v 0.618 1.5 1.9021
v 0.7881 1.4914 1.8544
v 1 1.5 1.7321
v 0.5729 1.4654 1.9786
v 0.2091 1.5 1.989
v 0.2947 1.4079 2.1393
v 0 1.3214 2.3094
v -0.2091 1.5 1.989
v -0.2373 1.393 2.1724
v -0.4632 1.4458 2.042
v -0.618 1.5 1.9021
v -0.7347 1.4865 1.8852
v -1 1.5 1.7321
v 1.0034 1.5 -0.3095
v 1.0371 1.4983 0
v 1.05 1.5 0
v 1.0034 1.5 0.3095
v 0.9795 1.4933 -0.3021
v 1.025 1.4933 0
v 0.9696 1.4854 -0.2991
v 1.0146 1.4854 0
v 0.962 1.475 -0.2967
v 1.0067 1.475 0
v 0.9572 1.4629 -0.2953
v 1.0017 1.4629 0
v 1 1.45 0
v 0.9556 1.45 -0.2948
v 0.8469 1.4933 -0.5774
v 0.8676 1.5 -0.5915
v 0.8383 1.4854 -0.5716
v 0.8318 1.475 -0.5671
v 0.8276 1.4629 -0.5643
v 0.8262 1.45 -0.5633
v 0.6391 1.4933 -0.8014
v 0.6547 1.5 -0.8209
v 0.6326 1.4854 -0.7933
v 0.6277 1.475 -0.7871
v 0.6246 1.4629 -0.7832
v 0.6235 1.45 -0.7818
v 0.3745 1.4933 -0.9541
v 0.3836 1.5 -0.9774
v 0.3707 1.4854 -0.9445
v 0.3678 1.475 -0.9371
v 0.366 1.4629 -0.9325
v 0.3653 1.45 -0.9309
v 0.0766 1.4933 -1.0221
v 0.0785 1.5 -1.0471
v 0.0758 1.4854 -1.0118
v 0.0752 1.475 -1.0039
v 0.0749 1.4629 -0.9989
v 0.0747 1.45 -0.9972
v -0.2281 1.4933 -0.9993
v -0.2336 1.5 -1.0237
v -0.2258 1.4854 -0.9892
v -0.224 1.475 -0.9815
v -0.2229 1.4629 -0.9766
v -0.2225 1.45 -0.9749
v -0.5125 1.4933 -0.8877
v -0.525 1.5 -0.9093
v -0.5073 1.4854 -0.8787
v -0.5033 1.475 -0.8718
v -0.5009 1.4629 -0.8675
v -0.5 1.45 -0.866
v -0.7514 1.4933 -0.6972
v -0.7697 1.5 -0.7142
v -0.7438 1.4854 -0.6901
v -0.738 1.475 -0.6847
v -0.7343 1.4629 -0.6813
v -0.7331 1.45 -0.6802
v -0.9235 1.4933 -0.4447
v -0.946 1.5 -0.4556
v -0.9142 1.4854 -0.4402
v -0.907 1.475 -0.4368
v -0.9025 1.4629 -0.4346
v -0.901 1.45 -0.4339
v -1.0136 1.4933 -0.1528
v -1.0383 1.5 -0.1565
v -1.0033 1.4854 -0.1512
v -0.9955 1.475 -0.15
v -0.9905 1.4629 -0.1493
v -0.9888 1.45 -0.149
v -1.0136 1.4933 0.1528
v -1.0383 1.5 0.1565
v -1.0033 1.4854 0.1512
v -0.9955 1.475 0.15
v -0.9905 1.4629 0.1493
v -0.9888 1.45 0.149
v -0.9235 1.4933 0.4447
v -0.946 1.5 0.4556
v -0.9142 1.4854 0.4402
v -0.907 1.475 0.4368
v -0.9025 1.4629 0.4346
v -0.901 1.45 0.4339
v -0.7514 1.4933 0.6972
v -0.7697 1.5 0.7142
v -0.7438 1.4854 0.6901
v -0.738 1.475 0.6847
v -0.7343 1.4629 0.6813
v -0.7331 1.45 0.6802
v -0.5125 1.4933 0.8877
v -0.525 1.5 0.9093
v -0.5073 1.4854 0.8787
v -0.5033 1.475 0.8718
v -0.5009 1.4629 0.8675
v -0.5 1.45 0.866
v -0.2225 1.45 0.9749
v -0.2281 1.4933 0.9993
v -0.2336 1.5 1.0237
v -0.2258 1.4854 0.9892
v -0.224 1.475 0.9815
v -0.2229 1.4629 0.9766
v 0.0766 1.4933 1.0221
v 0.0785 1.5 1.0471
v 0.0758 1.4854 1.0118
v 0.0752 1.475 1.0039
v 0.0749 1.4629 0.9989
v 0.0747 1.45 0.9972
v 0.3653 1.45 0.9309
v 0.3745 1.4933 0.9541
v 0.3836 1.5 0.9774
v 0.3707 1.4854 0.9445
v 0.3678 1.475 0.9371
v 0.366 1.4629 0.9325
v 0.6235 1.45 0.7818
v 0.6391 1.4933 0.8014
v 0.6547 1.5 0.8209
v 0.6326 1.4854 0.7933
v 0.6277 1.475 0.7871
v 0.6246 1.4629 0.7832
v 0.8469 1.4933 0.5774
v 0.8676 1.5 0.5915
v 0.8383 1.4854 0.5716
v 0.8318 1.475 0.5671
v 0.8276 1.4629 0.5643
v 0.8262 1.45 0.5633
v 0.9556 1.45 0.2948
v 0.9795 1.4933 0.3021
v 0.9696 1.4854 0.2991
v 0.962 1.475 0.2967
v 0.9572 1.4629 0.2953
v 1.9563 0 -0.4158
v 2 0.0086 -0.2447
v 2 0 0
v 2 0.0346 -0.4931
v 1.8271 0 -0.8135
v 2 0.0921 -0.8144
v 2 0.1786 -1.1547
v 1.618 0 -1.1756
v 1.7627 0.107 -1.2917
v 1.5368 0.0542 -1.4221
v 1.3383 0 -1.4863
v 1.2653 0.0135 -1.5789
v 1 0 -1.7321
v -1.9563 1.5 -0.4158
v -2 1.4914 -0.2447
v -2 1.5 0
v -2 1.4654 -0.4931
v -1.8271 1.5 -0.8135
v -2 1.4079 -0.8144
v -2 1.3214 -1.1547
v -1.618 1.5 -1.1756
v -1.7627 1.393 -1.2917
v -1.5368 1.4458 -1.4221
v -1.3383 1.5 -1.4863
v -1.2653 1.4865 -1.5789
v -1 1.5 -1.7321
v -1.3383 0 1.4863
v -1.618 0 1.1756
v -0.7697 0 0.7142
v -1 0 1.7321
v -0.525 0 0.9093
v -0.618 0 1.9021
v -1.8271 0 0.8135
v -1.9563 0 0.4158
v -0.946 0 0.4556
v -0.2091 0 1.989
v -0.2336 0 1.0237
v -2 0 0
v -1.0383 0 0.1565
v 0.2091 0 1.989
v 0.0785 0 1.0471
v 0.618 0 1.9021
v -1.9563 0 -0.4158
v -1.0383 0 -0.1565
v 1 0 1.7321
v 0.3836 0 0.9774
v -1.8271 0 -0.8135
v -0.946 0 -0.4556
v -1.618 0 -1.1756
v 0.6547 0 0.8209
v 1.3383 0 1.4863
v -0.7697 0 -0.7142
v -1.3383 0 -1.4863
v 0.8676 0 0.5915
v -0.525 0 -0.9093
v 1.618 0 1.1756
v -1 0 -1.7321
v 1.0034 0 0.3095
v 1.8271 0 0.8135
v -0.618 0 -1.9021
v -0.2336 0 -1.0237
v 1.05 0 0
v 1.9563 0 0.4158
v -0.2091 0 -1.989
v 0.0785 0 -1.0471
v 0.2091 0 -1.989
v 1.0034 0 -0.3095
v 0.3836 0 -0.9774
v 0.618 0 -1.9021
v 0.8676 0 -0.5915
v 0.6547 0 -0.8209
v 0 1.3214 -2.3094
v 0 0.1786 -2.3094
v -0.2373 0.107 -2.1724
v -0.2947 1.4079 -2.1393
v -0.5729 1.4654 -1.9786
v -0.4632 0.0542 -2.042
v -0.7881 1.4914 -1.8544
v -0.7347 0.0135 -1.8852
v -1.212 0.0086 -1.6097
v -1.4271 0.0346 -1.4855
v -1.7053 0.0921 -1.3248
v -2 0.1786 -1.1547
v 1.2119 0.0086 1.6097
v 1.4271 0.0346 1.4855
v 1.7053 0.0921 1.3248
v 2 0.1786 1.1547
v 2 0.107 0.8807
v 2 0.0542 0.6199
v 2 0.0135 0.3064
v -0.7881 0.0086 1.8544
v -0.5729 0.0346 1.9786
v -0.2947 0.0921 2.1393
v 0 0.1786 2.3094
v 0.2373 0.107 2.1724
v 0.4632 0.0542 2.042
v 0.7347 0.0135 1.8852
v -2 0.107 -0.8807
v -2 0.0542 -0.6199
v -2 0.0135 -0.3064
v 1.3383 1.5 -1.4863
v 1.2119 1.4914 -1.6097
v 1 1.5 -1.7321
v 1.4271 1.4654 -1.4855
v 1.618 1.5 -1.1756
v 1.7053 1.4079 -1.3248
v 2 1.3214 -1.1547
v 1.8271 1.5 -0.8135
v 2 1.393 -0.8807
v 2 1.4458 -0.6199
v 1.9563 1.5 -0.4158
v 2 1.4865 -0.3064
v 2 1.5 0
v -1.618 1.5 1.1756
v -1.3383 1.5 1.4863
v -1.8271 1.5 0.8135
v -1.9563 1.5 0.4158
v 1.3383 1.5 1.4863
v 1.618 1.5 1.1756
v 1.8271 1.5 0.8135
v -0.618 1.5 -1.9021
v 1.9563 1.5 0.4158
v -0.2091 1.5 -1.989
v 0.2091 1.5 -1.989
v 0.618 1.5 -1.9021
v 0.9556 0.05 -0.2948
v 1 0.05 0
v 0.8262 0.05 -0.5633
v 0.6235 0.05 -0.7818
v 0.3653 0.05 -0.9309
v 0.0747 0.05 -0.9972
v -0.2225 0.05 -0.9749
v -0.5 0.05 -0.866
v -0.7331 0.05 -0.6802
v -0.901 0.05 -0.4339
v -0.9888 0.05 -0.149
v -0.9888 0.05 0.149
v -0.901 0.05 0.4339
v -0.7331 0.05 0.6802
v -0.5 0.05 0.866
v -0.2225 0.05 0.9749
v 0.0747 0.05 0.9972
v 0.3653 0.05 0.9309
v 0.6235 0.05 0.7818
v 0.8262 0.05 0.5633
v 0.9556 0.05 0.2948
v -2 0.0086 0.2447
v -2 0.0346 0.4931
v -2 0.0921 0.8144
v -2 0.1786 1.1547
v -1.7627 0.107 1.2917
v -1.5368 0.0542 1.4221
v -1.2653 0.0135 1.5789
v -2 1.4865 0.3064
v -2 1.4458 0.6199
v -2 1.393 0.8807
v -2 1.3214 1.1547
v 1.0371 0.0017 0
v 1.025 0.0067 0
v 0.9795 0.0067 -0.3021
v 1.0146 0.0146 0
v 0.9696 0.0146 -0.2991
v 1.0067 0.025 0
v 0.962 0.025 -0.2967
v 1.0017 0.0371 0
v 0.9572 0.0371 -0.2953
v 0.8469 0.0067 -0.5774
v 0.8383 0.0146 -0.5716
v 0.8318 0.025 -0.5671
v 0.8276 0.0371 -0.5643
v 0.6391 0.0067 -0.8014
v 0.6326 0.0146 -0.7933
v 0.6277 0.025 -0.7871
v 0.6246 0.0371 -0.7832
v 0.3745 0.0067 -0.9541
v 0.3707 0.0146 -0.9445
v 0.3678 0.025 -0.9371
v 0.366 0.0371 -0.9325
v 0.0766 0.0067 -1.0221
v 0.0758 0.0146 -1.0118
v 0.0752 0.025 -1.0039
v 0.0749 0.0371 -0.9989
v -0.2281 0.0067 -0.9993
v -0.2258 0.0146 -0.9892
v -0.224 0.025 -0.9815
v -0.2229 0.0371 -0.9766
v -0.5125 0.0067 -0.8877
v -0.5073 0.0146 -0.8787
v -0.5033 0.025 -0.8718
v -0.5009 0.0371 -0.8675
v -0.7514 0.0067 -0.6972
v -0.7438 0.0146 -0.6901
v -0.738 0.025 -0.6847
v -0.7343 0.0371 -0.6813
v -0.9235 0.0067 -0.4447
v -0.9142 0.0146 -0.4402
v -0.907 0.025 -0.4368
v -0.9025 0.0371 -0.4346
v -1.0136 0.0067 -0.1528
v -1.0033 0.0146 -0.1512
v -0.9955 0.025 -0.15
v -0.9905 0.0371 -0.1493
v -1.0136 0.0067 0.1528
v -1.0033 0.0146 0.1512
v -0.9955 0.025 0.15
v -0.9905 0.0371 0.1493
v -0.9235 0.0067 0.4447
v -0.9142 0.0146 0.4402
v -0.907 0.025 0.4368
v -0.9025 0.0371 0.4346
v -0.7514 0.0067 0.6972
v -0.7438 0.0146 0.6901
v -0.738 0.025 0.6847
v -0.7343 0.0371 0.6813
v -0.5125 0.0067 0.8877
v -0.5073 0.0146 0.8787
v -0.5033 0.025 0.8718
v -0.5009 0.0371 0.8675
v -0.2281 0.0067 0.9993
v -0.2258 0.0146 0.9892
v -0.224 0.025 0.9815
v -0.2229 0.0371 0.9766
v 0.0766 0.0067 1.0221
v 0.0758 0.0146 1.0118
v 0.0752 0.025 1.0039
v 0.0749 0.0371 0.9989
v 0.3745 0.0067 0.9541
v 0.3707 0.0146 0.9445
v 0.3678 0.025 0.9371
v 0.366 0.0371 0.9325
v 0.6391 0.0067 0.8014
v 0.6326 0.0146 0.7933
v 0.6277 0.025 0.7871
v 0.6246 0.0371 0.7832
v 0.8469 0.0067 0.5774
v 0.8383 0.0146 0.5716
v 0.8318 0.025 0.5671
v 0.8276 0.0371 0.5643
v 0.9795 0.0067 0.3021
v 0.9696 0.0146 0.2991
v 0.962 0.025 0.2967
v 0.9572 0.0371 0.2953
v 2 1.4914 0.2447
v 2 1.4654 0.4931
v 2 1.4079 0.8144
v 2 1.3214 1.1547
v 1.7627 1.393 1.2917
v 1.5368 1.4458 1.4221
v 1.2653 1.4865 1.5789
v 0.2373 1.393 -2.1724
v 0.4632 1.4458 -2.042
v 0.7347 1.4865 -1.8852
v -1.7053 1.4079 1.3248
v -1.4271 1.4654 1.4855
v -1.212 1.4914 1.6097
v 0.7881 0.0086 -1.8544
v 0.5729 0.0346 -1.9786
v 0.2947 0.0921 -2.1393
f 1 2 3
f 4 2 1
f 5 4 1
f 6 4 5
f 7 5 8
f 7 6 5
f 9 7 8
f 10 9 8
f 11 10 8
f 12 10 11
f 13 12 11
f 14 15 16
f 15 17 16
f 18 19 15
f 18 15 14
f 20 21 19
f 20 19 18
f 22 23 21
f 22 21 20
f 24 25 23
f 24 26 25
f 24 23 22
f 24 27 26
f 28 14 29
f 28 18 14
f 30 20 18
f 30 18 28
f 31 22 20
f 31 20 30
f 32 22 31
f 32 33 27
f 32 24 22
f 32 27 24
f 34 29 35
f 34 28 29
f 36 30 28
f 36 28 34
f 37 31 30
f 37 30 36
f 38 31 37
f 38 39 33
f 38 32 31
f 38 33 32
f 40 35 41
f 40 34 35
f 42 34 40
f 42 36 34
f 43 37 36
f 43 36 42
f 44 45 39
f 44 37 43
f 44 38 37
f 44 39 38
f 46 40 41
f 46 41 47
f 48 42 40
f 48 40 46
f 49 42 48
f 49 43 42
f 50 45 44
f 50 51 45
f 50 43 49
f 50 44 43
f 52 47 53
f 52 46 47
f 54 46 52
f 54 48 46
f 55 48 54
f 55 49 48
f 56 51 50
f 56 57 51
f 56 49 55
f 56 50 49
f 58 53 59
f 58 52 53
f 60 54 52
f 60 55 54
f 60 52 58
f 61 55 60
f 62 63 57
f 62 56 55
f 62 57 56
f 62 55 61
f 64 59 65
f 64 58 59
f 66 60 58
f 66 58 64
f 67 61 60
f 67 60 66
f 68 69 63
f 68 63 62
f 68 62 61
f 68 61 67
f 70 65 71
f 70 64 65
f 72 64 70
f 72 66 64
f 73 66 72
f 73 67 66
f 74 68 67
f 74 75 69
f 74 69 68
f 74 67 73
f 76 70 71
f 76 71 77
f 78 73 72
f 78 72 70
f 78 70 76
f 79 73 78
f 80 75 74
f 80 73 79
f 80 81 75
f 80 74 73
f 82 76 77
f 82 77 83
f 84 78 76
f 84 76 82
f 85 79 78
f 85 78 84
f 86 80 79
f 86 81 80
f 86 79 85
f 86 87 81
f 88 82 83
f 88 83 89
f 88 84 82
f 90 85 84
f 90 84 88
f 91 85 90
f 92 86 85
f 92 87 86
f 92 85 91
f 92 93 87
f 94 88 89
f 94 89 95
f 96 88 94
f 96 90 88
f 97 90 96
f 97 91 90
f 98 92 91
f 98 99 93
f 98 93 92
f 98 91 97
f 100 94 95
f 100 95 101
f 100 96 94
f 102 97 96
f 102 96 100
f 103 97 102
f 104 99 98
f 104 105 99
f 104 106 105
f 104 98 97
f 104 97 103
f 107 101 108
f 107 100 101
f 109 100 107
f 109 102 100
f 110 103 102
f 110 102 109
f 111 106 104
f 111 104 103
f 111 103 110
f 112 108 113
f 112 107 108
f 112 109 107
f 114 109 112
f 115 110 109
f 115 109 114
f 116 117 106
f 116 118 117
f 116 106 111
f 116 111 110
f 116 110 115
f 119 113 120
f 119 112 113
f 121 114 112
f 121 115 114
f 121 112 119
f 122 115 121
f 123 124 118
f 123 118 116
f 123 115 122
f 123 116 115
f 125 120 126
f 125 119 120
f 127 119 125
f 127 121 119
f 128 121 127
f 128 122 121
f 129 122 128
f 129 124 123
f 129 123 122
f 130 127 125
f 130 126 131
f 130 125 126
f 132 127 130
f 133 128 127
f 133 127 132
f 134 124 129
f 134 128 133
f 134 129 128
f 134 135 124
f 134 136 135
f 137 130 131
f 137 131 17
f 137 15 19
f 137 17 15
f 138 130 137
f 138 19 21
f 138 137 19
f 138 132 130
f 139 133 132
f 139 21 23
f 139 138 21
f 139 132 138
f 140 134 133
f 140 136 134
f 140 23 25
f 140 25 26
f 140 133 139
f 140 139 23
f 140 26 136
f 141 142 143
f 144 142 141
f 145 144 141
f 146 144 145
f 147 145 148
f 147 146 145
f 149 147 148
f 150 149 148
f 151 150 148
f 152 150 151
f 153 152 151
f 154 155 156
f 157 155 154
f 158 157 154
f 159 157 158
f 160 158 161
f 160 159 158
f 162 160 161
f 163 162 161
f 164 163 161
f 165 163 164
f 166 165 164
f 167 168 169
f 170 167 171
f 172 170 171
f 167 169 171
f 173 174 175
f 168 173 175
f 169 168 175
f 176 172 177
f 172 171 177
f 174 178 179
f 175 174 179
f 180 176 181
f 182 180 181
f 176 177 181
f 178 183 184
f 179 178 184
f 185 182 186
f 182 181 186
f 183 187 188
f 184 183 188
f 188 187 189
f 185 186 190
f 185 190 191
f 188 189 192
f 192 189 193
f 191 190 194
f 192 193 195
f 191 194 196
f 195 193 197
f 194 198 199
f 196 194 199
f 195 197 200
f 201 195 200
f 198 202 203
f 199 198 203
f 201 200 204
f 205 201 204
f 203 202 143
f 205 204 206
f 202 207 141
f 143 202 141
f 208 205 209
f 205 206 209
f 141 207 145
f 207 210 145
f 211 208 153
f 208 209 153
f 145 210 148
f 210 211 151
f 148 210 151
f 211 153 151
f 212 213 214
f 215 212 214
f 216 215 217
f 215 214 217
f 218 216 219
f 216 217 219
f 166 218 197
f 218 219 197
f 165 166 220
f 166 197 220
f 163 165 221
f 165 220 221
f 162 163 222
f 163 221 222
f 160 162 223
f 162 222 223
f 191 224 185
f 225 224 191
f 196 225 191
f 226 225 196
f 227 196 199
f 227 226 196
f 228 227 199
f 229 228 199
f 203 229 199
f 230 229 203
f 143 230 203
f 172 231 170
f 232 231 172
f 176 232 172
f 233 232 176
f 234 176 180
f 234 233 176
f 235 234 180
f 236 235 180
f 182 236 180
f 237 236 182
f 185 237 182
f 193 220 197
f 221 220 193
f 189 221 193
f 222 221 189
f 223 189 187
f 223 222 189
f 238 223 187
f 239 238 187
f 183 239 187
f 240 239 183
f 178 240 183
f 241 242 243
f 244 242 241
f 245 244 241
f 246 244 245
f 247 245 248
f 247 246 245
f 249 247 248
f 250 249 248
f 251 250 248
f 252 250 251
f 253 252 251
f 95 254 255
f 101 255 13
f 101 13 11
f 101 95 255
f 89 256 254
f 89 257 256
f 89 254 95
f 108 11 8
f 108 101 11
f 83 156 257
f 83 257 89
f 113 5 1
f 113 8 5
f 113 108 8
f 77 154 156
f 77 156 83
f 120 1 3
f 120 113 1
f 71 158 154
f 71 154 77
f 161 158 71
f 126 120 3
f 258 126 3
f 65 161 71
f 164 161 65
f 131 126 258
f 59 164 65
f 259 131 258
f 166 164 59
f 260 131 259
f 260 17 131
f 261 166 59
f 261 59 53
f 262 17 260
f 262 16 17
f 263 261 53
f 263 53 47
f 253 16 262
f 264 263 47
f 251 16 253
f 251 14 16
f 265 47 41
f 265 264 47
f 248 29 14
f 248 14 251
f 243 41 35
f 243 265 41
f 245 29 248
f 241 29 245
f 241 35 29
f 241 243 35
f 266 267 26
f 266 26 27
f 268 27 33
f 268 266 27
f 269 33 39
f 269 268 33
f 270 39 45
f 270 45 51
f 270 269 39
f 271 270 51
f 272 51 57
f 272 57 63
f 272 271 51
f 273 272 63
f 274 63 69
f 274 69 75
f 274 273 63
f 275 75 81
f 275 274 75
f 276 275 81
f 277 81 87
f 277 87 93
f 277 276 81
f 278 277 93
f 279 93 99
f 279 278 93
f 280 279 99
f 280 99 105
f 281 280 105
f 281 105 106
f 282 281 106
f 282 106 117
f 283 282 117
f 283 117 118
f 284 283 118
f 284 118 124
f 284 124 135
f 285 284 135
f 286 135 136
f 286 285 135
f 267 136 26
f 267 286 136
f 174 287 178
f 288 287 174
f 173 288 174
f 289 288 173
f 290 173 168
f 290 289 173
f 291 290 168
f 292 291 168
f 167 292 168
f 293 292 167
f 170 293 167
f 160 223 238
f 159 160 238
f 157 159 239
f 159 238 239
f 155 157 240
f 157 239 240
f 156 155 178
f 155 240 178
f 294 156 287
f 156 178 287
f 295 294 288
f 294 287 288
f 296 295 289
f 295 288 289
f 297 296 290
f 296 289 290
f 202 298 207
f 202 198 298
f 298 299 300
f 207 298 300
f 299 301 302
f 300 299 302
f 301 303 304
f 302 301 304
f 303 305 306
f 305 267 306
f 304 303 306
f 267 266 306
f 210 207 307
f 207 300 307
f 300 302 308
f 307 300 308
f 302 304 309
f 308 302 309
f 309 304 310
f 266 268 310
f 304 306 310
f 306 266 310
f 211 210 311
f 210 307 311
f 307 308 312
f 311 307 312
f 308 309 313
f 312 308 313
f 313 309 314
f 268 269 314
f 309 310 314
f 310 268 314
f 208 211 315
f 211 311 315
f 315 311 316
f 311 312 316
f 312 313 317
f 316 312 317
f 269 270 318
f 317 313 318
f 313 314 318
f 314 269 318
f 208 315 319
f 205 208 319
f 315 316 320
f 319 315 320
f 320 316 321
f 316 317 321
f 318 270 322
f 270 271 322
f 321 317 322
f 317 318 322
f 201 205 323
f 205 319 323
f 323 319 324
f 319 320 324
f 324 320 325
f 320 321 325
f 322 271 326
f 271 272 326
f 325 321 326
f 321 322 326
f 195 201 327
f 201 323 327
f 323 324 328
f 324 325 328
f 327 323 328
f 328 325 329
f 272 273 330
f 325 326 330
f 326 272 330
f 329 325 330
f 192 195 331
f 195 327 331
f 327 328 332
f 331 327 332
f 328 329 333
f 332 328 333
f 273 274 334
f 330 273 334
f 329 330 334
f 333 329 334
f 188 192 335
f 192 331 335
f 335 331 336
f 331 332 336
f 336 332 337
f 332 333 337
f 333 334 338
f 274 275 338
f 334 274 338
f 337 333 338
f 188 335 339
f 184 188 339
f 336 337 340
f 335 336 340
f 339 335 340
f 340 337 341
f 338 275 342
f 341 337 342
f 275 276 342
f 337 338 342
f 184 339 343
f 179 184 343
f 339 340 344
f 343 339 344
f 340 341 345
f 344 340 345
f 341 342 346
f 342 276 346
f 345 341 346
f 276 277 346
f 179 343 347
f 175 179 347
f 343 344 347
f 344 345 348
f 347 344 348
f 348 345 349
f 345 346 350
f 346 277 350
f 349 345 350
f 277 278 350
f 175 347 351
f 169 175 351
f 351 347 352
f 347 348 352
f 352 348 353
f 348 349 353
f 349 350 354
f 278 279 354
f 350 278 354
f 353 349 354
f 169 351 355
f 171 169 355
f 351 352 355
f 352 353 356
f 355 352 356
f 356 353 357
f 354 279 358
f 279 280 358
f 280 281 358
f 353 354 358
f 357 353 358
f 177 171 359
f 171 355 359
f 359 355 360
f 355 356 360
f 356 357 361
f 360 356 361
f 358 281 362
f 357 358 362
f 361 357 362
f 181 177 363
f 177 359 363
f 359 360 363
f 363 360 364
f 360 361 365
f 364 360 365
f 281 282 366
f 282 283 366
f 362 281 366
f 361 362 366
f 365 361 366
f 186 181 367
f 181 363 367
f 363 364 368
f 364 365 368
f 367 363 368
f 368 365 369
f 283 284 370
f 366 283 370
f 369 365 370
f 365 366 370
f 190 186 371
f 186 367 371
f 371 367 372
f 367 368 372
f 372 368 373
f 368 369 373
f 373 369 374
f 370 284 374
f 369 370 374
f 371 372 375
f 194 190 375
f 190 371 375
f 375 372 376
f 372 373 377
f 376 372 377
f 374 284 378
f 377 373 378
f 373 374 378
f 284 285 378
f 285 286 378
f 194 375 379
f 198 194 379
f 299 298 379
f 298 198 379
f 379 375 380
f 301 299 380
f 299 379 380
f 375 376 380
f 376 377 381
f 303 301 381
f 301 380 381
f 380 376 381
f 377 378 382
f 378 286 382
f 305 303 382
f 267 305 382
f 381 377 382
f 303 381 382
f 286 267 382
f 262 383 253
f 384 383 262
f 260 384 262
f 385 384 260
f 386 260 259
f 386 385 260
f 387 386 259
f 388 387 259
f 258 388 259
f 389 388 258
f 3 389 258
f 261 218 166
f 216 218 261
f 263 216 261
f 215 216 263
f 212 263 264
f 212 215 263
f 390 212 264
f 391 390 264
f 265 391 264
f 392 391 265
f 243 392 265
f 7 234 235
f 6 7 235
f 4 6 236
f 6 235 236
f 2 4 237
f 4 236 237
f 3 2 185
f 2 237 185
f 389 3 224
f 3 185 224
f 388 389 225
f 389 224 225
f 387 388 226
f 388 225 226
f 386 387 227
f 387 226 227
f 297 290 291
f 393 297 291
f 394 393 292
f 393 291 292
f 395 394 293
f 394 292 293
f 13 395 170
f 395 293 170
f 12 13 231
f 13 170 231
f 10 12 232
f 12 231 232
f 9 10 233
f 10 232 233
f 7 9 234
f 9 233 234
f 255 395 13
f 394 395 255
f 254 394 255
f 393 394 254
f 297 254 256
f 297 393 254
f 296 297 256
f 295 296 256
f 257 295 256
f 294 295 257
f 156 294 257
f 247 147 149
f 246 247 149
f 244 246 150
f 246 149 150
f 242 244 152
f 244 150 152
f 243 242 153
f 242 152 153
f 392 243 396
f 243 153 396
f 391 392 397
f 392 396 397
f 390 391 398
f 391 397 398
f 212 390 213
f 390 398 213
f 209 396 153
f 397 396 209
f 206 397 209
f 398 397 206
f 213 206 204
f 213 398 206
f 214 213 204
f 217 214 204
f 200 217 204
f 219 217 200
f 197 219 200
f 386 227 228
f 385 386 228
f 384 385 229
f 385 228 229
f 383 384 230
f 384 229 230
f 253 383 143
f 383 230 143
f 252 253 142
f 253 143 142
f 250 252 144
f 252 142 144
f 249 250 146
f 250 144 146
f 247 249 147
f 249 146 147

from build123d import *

# Parameters (mm, degrees)
SKETCH2_R           = 1
BOSS_EXTRUDE1_DEPTH = 1.5
SKETCH3_OUTSIDE_W   = 14.186
SKETCH3_OUTSIDE_H   = 14.804
SKETCH3_OUTSIDE_R   = 2
CUT_EXTRUDE1_DEPTH  = 2
CUT_EXTRUDE1_TAPER  = 60
SKETCH4_OUTSIDE_W   = 14.186
SKETCH4_OUTSIDE_H   = 14.804
SKETCH4_OUTSIDE_R   = 2
CUT_EXTRUDE2_DEPTH  = 2
CUT_EXTRUDE2_TAPER  = 60
FILLET1_R           = 0.05


with BuildPart() as part:
    # Sketch2 → Boss-Extrude1 (new body)
    with BuildSketch(Plane(origin=(0, 0, 0), x_dir=(1, 0, 0), z_dir=(0, 1, 0))):
        Polygon((2, -1.154700538), (2, 1.154700538), (0, 2.309401077), (-2, 1.154700538), (-2, -1.154700538), (0, -2.309401077), align=None)
        Circle(SKETCH2_R, mode=Mode.SUBTRACT)
    extrude(amount=BOSS_EXTRUDE1_DEPTH)

    # Sketch3 outside → Cut-Extrude1 (cut)
    with BuildSketch(Plane(origin=(0, 1.5, 0), x_dir=(1, 0, 0), z_dir=(0, 1, 0))):
        Rectangle(SKETCH3_OUTSIDE_W, SKETCH3_OUTSIDE_H)
        Circle(SKETCH3_OUTSIDE_R, mode=Mode.SUBTRACT)
    extrude(amount=-CUT_EXTRUDE1_DEPTH, taper=CUT_EXTRUDE1_TAPER, mode=Mode.SUBTRACT)

    # Sketch4 outside → Cut-Extrude2 (cut)
    with BuildSketch(Plane.XZ):
        Rectangle(SKETCH4_OUTSIDE_W, SKETCH4_OUTSIDE_H)
        Circle(SKETCH4_OUTSIDE_R, mode=Mode.SUBTRACT)
    extrude(amount=-CUT_EXTRUDE2_DEPTH, taper=CUT_EXTRUDE2_TAPER, mode=Mode.SUBTRACT)

    # Fillet1
    fillet1_edges = [part.edges().sort_by_distance(p)[0] for p in [
        (-1, 0, 0),
        (-1, 1.5, 0),
    ]]
    fillet(fillet1_edges, radius=FILLET1_R)


solid = part.part
